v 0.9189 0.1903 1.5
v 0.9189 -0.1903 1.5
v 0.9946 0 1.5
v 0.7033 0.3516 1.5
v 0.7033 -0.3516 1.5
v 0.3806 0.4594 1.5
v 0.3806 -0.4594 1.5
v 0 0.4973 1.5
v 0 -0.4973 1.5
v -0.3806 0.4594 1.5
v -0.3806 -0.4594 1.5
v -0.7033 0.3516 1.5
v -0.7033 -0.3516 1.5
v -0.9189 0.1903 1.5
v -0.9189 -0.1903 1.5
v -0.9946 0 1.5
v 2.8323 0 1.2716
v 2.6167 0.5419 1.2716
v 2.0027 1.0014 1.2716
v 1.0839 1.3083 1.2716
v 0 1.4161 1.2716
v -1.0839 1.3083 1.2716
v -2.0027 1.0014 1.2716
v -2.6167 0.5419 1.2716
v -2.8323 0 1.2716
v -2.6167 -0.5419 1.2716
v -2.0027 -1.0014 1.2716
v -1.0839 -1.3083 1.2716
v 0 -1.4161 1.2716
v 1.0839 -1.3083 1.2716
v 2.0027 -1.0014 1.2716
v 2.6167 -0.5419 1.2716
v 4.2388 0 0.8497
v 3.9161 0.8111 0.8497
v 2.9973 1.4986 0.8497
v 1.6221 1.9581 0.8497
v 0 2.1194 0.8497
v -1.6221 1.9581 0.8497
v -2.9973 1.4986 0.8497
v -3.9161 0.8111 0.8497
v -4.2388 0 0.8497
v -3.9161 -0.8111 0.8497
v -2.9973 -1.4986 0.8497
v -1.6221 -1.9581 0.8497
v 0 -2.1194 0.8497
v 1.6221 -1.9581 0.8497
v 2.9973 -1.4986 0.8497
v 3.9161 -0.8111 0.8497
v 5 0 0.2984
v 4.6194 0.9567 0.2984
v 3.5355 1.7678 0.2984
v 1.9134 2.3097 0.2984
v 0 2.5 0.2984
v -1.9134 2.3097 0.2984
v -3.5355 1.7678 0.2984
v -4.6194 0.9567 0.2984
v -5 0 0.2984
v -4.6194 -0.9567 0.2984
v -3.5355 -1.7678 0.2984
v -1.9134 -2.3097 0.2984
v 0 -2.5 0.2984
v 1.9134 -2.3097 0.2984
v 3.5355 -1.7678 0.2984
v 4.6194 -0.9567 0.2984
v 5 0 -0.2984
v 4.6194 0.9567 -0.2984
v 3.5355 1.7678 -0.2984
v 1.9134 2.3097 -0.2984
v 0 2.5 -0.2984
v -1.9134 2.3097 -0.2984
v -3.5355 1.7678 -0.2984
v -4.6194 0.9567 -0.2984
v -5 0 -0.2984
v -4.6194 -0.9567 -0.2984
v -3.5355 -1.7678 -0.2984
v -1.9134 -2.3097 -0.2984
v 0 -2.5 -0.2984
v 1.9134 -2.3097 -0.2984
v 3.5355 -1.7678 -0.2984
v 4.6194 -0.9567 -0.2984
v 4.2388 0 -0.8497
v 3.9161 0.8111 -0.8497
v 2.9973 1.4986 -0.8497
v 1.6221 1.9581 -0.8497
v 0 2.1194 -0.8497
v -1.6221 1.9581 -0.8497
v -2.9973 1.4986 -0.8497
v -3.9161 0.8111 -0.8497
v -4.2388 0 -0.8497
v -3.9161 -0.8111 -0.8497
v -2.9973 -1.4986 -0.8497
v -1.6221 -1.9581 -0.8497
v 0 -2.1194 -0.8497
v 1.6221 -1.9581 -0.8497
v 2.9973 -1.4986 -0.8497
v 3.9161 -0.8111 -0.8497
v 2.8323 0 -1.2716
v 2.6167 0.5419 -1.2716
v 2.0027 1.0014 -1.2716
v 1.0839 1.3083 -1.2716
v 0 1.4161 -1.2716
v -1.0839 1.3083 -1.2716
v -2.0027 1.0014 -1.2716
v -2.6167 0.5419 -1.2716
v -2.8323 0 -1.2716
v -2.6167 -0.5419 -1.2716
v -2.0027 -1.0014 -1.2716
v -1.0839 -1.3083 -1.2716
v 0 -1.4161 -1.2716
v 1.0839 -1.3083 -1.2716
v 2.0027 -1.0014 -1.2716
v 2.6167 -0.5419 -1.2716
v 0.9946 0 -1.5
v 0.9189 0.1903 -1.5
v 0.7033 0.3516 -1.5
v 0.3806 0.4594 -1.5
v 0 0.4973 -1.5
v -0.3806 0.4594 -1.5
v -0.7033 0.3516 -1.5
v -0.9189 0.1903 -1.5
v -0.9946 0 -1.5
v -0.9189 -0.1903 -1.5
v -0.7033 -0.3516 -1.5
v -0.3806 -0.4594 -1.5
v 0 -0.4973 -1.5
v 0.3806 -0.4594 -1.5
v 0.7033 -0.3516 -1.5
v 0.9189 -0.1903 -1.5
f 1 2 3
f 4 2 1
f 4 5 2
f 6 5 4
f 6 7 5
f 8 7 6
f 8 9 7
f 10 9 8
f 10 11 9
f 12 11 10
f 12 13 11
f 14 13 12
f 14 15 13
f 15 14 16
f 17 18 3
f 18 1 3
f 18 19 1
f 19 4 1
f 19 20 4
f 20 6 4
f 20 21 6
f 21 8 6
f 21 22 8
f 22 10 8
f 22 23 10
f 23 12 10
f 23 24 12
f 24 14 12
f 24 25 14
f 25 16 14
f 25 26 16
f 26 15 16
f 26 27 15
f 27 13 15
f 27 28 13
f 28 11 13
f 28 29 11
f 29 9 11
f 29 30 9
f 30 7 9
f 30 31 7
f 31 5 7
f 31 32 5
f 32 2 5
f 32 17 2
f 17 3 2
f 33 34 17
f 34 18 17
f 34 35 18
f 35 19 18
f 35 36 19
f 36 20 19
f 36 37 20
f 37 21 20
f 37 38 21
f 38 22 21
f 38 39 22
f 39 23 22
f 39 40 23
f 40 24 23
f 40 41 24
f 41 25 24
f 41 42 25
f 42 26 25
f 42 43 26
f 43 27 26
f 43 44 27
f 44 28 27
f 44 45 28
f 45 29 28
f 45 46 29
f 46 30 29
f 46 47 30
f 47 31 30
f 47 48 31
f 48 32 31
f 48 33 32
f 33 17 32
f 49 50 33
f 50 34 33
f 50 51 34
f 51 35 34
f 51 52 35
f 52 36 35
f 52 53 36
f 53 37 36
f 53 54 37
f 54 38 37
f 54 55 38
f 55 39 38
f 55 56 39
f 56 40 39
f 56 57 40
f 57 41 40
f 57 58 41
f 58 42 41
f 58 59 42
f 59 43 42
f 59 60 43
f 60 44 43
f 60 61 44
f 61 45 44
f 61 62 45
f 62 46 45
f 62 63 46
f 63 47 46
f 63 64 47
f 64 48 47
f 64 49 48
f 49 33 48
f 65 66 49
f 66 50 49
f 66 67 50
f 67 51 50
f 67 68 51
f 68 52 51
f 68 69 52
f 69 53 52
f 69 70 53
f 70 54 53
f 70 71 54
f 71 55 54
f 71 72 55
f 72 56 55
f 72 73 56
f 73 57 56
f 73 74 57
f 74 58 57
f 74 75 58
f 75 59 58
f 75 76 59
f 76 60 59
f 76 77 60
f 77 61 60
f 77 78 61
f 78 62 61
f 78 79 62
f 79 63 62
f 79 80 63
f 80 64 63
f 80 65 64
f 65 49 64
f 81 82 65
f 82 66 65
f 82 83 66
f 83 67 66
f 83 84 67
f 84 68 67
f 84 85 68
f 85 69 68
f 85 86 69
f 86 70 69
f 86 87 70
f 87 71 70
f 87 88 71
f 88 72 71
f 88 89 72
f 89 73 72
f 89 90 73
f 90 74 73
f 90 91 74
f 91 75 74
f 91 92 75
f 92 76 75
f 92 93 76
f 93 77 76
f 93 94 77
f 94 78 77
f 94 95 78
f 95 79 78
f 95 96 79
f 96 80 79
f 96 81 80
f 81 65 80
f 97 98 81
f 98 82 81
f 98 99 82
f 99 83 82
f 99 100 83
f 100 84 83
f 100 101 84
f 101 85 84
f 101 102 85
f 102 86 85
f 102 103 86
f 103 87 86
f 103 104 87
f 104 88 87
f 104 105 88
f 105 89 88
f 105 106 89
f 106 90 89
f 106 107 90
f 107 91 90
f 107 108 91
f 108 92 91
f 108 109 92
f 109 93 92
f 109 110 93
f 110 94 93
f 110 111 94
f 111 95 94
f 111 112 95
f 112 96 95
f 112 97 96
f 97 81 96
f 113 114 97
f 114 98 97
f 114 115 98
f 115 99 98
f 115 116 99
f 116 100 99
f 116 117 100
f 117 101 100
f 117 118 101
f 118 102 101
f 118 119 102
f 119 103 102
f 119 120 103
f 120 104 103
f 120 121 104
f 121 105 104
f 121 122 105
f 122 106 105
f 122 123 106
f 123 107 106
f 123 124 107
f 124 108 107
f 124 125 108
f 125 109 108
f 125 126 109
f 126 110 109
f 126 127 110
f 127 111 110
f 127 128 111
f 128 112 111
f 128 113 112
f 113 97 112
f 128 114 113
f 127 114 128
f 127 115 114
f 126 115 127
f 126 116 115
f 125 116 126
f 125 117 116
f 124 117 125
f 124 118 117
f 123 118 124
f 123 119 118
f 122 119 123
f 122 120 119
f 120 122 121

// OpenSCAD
// resize to an exact size
resize([10, 5, 3]) sphere(1, $fn = 16);
